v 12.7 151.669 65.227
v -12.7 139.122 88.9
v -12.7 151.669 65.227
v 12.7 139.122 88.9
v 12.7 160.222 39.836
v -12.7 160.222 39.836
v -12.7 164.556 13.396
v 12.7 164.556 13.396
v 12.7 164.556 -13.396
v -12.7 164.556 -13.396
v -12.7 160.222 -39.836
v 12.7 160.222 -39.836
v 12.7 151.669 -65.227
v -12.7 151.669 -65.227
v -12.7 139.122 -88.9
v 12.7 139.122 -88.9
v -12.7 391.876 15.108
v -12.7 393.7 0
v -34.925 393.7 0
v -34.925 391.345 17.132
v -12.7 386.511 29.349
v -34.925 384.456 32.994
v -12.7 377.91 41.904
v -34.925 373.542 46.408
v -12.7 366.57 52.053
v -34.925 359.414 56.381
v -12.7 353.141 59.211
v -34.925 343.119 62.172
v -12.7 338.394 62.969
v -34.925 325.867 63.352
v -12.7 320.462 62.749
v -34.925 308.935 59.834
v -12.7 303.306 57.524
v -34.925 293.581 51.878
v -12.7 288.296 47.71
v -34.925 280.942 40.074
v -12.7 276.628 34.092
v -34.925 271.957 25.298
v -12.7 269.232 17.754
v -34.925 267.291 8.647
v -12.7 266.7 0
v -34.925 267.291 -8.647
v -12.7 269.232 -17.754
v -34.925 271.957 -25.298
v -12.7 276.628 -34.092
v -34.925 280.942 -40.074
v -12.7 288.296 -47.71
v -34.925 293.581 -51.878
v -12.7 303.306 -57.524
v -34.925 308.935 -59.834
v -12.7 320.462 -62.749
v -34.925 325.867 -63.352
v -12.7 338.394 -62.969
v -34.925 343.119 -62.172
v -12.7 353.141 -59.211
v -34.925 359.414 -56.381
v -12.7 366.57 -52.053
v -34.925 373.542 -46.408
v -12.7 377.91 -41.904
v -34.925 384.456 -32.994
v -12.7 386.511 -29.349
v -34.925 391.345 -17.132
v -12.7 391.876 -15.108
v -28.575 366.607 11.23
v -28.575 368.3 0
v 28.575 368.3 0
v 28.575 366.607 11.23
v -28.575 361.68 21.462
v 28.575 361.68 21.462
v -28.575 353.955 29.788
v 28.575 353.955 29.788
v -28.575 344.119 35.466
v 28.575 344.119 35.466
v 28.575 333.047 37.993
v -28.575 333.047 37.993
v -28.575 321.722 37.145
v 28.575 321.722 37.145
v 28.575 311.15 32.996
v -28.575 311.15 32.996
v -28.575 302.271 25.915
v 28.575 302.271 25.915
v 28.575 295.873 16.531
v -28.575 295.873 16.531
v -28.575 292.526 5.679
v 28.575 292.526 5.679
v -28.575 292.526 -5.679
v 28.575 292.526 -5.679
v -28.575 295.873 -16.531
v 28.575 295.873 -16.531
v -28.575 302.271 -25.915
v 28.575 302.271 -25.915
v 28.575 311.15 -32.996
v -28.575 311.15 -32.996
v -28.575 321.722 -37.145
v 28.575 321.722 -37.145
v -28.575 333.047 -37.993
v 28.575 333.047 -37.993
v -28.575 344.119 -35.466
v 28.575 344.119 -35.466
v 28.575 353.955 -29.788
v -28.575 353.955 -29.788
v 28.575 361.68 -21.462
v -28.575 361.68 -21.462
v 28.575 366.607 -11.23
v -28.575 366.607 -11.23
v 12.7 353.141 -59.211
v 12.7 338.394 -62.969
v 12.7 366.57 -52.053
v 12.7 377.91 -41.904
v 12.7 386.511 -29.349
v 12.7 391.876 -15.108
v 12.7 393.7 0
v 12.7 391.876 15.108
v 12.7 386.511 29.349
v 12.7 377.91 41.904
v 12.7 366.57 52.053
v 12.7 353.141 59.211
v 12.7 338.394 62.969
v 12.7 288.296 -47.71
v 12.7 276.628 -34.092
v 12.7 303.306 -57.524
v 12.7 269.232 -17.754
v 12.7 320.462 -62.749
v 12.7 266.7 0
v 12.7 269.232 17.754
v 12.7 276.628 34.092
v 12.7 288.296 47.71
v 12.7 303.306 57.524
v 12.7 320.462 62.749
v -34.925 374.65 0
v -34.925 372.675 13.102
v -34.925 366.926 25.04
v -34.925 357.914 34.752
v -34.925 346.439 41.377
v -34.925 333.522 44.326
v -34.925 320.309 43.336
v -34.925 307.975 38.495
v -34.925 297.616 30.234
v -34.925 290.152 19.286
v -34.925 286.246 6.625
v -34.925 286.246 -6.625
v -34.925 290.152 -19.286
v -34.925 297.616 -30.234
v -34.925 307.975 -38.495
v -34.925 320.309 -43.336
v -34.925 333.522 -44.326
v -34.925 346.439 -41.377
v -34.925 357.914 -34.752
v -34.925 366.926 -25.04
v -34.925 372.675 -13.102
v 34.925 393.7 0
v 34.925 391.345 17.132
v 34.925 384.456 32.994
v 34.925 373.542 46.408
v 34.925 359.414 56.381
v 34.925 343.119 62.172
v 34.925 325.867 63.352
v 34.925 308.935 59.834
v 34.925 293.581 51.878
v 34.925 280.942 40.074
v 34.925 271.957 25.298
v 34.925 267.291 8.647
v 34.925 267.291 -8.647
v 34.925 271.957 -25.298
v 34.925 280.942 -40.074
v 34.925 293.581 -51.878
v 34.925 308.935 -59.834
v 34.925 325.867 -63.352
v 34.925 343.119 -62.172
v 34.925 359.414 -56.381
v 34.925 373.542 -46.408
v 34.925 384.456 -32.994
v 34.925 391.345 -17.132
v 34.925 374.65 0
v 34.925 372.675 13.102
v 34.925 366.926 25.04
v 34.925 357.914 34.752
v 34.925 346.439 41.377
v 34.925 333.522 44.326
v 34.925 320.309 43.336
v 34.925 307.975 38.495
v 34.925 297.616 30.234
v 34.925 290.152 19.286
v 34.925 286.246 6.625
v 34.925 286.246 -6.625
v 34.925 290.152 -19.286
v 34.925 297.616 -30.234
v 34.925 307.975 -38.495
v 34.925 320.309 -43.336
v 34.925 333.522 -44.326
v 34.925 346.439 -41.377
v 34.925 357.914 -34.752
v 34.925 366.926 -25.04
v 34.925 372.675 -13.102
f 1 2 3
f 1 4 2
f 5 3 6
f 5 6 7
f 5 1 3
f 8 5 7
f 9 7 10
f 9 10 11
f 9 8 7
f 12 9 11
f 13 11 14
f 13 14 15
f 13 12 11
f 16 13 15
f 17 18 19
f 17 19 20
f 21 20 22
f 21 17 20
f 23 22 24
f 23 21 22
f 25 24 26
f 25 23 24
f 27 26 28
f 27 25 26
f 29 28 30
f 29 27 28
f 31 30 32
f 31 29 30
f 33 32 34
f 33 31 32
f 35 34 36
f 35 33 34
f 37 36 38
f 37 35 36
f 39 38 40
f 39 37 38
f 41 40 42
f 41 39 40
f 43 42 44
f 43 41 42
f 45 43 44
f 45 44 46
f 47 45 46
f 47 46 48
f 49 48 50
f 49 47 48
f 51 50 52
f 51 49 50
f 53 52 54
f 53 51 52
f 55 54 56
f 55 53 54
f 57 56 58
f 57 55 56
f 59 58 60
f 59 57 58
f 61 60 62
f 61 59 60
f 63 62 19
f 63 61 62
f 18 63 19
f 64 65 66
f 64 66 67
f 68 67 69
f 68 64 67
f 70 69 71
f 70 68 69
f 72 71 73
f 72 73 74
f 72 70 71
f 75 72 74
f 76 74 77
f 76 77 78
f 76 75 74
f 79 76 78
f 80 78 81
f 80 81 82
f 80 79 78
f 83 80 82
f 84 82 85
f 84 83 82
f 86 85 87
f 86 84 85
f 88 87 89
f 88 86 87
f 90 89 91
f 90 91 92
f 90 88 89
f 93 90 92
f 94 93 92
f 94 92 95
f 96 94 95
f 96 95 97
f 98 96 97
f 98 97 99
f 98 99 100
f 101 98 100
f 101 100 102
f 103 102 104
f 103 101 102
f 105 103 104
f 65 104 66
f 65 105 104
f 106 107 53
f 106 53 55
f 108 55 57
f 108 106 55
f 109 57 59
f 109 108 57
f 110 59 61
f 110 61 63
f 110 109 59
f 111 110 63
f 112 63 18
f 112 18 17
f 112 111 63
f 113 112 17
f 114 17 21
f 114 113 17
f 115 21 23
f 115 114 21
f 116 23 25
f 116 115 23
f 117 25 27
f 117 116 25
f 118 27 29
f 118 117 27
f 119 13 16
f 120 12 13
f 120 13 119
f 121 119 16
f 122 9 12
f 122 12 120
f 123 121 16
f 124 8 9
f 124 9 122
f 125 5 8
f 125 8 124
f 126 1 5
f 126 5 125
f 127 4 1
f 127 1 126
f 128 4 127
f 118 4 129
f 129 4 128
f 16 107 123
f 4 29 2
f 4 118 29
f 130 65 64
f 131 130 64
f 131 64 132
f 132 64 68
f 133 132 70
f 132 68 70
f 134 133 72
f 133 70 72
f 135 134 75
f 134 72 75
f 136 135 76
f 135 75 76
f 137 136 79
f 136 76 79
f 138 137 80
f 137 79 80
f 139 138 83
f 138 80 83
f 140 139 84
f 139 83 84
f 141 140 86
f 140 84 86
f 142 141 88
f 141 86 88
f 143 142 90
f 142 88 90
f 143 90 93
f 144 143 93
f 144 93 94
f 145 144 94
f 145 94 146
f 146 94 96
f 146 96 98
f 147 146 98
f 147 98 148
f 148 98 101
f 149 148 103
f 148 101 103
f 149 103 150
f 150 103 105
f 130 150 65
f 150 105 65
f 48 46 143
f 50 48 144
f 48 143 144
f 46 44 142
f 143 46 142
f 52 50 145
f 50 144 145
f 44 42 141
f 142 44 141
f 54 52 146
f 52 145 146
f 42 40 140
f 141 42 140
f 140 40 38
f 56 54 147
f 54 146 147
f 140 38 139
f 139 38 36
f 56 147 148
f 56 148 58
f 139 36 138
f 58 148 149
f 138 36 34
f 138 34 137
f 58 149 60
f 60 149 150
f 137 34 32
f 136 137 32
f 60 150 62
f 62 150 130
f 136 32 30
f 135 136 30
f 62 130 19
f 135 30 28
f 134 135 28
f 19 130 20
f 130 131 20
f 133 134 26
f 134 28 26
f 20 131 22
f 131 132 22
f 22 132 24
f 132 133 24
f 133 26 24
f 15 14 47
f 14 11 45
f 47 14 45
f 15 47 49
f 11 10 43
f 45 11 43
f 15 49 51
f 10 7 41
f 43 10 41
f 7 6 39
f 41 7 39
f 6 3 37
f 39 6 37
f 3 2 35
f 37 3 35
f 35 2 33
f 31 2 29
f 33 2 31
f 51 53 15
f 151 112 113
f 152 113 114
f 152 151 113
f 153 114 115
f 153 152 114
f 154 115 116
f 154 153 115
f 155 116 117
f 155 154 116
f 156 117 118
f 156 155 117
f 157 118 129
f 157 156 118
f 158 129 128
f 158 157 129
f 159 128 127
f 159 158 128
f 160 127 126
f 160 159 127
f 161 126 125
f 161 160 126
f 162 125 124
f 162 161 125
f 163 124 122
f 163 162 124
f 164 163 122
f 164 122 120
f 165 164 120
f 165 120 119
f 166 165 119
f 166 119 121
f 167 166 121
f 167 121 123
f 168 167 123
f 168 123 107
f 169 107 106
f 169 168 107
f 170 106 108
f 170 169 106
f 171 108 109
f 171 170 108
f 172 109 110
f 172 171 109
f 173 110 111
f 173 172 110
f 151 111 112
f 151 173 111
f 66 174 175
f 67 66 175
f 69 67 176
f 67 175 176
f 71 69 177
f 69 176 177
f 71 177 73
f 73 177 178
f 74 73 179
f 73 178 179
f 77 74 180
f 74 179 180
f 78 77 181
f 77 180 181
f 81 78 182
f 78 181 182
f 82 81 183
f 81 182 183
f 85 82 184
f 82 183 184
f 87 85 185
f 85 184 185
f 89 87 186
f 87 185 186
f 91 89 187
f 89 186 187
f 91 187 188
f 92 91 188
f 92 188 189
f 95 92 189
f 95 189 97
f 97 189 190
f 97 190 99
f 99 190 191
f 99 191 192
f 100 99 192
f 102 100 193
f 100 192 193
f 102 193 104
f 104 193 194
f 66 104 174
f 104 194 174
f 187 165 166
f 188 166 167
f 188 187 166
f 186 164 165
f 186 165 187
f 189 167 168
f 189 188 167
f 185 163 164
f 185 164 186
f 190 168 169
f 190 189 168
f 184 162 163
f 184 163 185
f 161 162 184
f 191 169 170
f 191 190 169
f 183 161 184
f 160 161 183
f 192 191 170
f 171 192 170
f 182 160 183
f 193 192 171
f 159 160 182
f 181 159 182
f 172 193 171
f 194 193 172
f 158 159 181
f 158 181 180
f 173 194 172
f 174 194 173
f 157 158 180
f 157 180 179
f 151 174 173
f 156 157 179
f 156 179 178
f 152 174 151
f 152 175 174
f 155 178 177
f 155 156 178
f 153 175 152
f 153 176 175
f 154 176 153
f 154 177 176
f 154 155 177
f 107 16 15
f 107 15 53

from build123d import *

# Parameters (mm, degrees)
F0_R     = 38.1
F1_DEPTH = 12.7
F2_R     = 63.5
F2_R_2   = 38.1
F3_DEPTH = 34.925
F4_SIZE  = 6.35


with BuildPart() as f1:
    # F0 (on Right) → F1 (new body, symmetric)
    with BuildSketch(Plane.YZ):
        with BuildLine():
            ThreePointArc((139.12153, 88.9), (165.1, 0), (139.12153, -88.9))
            Line((139.12153, -88.9), (338.394032, -62.969102))
            ThreePointArc((338.394032, -62.969102), (393.7, 0), (338.394032, 62.969102))
            Line((338.394032, 62.969102), (139.12153, 88.9))
        make_face()
        with Locations((330.2, 0)):
            Circle(F0_R, mode=Mode.SUBTRACT)
    extrude(amount=F1_DEPTH, both=True)

    # F2 (on Right) → F3 (join, symmetric)
    with BuildSketch(Plane.YZ):
        with Locations((330.2, 0)):
            Circle(F2_R)
        with Locations((330.2, 0)):
            Circle(F2_R_2, mode=Mode.SUBTRACT)
    extrude(amount=F3_DEPTH, both=True)

    # F4
    f4_edges = [f1.edges().sort_by_distance(p)[0] for p in [
        (-34.925, 292.1, 0),
        (34.925, 292.1, 0),
    ]]
    chamfer(f4_edges, length=F4_SIZE)


solid = f1.part
